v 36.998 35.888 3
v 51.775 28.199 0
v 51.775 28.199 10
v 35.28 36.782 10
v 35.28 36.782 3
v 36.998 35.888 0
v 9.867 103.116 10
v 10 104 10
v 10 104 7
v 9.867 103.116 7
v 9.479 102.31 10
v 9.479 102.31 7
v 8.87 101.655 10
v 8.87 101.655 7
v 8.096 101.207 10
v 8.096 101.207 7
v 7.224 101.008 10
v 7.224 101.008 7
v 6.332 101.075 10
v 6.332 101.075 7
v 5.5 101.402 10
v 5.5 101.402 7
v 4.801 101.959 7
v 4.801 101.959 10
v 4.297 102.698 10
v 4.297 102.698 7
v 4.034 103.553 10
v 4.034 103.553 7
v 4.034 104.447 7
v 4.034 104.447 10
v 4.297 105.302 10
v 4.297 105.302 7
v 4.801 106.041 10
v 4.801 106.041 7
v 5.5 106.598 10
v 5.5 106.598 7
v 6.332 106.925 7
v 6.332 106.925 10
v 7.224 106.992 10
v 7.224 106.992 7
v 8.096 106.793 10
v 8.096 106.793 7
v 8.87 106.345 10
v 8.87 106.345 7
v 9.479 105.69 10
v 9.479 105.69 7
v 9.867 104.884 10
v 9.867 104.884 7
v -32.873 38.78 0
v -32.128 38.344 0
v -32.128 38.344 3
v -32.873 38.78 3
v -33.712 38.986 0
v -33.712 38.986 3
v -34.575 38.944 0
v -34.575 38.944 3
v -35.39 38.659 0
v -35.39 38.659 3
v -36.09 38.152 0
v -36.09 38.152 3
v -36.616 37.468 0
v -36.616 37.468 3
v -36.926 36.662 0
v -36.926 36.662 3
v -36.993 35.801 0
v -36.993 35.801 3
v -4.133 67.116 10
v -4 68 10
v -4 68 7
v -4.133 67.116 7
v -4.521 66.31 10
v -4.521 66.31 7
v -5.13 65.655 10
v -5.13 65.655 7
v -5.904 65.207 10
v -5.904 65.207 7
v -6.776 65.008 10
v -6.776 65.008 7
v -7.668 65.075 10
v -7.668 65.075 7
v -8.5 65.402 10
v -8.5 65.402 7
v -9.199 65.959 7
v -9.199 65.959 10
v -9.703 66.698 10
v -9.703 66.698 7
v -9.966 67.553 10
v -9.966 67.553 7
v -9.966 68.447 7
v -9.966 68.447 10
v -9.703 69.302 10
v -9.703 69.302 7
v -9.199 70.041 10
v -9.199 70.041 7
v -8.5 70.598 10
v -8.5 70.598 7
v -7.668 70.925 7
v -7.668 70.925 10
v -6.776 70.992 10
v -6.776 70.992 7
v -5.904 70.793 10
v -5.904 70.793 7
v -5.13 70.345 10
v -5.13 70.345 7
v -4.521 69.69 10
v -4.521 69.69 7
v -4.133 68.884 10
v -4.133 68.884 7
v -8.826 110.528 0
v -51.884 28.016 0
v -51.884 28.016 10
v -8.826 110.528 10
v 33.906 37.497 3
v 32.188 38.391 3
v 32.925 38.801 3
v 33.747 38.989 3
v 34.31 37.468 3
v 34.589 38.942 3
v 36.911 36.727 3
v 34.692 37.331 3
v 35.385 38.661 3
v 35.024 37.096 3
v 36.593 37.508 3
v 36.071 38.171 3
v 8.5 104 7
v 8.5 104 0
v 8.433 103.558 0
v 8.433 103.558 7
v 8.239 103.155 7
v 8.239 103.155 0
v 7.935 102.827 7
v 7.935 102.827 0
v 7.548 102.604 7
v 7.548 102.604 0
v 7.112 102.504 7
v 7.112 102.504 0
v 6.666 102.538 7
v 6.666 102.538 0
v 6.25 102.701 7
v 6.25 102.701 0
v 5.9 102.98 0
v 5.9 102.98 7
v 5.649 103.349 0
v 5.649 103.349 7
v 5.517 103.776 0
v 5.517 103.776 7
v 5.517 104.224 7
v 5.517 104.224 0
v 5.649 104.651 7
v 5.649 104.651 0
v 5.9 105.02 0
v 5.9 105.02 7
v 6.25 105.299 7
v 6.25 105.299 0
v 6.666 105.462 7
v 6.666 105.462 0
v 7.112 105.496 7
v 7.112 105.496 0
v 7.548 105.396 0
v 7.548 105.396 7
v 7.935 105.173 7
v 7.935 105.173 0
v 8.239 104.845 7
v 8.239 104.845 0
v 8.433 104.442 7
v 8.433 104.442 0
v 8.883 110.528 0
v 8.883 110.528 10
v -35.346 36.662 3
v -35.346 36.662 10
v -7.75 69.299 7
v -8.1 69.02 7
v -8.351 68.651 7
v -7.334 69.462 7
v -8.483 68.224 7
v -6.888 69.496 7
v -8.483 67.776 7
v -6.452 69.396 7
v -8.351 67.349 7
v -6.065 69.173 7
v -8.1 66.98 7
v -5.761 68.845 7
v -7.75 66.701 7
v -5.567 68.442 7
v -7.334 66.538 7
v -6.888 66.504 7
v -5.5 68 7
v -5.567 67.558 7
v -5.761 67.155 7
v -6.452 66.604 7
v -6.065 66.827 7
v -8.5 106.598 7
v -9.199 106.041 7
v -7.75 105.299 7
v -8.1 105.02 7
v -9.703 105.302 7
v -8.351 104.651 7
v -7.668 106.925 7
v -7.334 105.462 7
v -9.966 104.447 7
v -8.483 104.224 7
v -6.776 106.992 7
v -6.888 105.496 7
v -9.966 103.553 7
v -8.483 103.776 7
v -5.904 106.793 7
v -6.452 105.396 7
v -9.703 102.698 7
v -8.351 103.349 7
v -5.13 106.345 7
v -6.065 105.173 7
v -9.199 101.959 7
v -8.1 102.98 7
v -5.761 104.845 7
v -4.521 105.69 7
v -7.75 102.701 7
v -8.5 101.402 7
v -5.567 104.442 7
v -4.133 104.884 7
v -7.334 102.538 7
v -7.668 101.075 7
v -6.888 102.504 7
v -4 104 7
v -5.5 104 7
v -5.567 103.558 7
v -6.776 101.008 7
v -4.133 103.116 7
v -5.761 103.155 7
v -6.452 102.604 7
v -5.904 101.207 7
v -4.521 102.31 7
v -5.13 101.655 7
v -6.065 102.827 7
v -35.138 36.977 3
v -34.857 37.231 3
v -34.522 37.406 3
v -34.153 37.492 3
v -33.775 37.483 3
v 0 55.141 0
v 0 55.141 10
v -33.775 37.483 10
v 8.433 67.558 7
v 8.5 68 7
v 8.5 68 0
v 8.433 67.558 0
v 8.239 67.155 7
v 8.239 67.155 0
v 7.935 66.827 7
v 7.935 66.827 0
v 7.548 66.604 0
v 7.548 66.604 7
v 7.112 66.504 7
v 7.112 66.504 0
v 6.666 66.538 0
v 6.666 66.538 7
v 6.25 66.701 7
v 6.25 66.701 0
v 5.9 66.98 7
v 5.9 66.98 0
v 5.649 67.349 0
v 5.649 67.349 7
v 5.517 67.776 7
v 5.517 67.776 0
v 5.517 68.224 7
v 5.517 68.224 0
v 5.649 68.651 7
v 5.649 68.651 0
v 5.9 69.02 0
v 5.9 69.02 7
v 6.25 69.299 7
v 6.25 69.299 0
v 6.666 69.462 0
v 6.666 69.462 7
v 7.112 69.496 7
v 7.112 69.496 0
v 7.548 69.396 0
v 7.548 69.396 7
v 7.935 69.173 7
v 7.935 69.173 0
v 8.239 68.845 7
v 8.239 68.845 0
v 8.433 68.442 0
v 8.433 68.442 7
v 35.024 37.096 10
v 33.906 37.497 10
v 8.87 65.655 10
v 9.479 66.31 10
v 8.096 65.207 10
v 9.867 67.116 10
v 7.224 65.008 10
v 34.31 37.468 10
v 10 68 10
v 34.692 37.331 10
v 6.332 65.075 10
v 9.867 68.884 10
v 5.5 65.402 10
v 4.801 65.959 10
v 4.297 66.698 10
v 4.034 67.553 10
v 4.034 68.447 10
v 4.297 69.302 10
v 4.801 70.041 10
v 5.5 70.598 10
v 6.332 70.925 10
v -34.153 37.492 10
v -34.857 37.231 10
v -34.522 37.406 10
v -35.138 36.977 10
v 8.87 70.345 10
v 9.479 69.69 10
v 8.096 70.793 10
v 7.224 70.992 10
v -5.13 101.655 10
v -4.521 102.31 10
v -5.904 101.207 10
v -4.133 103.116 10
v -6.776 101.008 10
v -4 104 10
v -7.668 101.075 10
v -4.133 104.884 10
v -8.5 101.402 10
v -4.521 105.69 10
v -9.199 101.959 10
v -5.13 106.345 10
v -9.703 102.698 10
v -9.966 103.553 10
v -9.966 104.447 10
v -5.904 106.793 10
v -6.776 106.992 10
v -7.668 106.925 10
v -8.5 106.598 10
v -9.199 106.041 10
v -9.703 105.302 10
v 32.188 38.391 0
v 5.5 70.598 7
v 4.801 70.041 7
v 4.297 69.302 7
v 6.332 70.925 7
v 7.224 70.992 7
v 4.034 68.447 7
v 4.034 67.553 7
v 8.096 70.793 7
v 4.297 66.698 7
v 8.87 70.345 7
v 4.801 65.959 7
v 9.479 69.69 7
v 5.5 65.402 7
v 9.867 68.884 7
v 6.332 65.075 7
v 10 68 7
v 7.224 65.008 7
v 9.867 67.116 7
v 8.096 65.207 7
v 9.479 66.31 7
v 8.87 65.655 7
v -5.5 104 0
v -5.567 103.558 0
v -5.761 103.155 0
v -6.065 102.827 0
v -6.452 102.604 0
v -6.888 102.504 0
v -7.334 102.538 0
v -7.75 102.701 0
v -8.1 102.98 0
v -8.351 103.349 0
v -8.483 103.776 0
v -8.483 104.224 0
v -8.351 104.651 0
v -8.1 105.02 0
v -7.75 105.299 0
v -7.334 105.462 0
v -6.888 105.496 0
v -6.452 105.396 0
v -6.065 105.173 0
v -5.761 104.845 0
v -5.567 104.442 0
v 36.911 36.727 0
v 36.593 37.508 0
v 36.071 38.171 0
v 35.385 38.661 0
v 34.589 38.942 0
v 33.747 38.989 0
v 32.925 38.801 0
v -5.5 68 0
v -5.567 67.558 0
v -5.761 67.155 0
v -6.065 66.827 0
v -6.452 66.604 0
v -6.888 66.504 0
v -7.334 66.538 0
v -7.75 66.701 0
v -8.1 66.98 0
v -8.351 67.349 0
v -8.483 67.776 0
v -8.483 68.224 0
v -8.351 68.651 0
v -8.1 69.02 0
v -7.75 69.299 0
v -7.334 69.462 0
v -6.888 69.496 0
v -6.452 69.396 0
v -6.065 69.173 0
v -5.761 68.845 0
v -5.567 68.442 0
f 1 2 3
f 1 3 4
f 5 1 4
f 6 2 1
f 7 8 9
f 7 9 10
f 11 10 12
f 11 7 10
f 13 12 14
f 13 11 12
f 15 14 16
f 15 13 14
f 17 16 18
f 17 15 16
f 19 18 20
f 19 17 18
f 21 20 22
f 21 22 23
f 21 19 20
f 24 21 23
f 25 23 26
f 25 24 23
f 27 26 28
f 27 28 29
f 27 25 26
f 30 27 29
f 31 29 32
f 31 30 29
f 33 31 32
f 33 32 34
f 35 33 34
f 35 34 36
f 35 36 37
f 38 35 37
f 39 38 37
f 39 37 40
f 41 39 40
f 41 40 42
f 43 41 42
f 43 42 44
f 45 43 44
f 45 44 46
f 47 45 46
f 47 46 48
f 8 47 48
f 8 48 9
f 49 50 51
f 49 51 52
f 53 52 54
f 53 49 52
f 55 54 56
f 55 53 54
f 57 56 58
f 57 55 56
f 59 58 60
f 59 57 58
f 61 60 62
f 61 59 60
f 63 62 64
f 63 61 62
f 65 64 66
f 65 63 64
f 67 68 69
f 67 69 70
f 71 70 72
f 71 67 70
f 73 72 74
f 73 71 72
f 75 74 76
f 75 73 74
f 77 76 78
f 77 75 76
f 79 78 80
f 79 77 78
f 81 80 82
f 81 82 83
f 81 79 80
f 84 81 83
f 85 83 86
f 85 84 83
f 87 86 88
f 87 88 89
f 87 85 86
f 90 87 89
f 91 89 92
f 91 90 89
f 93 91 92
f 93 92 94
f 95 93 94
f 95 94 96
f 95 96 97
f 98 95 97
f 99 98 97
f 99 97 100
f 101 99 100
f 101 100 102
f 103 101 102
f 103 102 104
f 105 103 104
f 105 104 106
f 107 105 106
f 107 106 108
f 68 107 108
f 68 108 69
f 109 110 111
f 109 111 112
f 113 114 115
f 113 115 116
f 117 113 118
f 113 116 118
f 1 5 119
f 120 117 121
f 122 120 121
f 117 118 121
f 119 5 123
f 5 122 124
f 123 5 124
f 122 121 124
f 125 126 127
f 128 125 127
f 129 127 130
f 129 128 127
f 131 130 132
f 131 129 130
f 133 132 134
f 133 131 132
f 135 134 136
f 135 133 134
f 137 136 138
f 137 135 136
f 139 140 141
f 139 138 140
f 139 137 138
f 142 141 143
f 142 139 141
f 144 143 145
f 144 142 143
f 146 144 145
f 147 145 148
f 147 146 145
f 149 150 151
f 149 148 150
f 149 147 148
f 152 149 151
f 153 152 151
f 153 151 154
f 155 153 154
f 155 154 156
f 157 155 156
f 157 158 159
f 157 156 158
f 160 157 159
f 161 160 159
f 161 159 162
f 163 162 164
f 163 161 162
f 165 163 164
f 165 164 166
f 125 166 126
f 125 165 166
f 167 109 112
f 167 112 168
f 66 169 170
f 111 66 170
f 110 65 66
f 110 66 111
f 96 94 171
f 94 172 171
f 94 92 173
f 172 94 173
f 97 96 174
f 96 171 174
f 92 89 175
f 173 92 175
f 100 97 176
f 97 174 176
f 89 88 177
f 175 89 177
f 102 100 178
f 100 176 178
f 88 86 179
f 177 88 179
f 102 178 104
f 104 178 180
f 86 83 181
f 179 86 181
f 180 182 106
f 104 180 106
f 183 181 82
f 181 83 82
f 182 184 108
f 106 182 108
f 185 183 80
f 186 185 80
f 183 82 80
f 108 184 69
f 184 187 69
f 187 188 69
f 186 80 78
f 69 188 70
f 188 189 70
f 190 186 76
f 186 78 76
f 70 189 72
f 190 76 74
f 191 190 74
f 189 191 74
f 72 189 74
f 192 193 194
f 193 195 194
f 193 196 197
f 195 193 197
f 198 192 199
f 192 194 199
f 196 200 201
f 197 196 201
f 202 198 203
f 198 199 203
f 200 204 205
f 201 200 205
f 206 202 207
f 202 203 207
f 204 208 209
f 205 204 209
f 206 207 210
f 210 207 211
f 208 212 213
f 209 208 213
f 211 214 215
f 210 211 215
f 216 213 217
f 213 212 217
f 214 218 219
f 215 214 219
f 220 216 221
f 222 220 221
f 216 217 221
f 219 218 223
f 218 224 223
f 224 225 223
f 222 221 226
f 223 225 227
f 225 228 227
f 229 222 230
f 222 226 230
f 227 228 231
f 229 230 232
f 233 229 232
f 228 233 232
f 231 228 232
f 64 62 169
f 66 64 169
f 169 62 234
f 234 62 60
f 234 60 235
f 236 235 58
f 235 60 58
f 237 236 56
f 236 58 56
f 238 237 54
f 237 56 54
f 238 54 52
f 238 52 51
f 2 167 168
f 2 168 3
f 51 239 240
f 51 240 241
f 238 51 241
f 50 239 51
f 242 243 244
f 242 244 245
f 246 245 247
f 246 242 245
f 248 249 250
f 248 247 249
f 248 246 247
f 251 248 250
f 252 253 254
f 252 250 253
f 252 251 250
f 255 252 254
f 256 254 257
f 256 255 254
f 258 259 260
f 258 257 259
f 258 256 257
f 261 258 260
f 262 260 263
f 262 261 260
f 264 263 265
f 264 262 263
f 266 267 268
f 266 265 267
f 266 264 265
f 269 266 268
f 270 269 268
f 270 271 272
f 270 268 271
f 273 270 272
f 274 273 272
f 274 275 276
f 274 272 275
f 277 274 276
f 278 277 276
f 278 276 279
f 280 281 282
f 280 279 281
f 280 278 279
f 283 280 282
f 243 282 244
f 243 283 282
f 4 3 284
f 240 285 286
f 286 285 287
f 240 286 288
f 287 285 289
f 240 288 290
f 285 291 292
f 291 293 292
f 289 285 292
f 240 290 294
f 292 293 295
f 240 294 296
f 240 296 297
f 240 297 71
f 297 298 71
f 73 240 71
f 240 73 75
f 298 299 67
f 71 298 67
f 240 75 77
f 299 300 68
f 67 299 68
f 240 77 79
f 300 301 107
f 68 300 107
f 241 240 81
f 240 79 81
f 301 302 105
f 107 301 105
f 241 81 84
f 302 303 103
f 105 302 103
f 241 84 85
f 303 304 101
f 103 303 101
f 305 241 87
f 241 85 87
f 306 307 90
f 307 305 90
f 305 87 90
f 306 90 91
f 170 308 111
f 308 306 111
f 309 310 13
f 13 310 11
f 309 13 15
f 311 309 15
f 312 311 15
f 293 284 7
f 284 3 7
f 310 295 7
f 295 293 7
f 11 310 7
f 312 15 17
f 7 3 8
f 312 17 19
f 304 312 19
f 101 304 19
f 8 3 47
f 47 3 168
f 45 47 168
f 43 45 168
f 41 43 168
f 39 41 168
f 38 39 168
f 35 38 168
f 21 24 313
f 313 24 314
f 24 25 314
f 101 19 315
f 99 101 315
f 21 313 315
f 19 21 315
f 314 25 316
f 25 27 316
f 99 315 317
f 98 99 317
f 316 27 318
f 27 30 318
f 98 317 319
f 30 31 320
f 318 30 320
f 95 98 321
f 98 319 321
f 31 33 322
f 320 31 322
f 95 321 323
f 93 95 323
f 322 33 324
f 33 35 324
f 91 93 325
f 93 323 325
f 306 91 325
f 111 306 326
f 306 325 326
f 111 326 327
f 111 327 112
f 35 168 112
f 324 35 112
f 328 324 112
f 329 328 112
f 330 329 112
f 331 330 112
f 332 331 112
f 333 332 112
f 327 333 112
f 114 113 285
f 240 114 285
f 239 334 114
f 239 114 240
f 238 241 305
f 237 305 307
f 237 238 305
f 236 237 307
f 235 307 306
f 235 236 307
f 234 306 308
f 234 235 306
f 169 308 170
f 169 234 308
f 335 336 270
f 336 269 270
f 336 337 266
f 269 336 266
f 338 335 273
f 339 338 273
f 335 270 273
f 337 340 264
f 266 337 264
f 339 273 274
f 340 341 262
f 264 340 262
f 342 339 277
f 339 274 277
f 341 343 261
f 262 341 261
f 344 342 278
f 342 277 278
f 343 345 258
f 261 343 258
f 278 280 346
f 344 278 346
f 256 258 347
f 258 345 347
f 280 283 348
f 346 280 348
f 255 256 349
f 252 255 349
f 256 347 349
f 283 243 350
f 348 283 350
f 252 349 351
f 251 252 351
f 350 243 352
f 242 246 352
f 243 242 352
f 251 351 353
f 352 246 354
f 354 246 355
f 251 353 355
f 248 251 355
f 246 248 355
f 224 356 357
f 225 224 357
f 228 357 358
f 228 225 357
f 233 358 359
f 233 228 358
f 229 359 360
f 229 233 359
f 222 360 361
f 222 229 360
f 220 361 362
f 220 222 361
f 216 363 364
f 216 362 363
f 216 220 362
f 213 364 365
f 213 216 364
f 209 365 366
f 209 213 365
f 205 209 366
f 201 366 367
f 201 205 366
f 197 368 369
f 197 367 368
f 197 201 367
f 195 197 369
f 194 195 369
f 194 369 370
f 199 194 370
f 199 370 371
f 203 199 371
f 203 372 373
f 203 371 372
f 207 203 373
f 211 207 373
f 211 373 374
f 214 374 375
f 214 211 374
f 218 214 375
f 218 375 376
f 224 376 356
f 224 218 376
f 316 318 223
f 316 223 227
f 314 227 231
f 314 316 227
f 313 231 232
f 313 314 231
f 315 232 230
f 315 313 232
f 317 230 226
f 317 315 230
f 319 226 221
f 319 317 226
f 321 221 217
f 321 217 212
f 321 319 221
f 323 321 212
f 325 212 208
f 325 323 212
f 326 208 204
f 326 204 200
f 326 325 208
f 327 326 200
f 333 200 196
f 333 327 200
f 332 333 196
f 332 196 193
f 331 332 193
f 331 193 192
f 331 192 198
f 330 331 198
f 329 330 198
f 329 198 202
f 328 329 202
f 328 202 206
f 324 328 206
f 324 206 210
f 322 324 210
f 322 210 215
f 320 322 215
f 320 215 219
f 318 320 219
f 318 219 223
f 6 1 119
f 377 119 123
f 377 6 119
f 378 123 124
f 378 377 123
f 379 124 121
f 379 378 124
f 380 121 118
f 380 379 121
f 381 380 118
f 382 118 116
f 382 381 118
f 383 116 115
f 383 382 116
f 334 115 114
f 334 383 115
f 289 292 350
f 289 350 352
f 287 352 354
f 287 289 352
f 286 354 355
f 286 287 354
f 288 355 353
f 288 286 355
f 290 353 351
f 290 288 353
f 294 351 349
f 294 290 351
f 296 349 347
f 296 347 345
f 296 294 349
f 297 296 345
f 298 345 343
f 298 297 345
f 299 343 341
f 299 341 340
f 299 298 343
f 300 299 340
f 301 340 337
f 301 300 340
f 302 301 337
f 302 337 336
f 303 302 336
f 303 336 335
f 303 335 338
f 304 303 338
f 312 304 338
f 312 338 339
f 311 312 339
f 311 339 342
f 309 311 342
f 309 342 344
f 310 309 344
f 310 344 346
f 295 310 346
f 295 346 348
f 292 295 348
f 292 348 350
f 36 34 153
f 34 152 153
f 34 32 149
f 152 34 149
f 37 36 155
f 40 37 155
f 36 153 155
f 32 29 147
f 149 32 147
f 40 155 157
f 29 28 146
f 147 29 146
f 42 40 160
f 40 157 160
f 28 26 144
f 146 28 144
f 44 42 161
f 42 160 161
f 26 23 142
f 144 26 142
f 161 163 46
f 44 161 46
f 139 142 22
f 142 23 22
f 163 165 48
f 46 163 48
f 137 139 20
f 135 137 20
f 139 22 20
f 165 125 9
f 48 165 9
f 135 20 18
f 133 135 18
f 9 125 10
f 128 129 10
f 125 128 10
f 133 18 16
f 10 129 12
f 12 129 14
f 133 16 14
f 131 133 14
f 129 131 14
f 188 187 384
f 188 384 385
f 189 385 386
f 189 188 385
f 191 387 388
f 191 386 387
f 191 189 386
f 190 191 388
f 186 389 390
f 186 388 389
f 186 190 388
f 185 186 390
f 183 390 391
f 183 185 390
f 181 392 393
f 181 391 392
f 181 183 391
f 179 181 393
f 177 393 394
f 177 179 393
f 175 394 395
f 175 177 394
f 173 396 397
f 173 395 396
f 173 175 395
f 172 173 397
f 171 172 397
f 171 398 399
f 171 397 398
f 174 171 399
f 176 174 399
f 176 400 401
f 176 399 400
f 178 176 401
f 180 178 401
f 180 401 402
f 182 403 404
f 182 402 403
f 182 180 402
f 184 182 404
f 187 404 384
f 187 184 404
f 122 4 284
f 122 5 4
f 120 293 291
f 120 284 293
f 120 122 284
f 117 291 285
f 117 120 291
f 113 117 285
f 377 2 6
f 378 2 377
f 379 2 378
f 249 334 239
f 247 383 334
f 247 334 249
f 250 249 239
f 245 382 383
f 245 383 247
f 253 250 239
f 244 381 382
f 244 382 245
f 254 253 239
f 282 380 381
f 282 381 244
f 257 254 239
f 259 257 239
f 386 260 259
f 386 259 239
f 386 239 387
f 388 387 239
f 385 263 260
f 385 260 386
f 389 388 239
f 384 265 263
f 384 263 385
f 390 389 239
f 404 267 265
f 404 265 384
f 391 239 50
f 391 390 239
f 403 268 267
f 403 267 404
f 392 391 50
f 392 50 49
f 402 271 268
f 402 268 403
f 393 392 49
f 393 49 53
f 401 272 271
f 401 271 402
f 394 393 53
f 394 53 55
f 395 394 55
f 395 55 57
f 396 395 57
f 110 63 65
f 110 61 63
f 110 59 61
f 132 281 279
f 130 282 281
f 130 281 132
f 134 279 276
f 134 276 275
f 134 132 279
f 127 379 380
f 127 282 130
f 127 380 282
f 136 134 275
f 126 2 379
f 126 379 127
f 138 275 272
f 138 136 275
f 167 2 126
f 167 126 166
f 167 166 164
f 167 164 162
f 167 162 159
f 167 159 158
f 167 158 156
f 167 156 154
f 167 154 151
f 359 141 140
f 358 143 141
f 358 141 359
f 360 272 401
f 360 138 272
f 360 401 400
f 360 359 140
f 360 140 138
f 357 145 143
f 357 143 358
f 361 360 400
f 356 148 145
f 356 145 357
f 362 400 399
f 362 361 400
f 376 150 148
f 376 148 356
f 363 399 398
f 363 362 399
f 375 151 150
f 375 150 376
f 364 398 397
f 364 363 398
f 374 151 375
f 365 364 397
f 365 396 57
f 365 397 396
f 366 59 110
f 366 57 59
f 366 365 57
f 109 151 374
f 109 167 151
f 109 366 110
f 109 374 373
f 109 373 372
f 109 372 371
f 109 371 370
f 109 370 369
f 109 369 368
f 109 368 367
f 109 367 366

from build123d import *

# Parameters (mm, degrees)
CYLINDER423_R               = 3
CYLINDER423_DEPTH           = 4
CYLINDER422_R               = 3
CYLINDER422_DEPTH           = 4
CYLINDER420_R               = 3
CYLINDER420_DEPTH           = 4
CYLINDER421_R               = 3
CYLINDER421_DEPTH           = 4
COMPOUND319_PLACEMENT_ANGLE = 90
CYLINDER419_R               = 1.5
CYLINDER419_DEPTH           = 20
CYLINDER418_R               = 1.5
CYLINDER418_DEPTH           = 20
CYLINDER416_R               = 1.5
CYLINDER416_DEPTH           = 20
CYLINDER417_R               = 1.5
CYLINDER417_DEPTH           = 20
COMPOUND318_PLACEMENT_ANGLE = 90
CYLINDER309_R               = 1.5
CYLINDER309_DEPTH           = 50
CYLINDER310_R               = 1.5
CYLINDER310_DEPTH           = 50
CYLINDER307_R               = 3
CYLINDER307_DEPTH           = 4
CYLINDER308_R               = 3
CYLINDER308_DEPTH           = 4
PAD_DEPTH                   = 10


with BuildPart() as v_lec423:
    # Cylinder423 → Cylinder423 (new body)
    with BuildSketch(Plane(origin=(-7, -34, 37), x_dir=(1, 0, 0), z_dir=(0, -1, 0))):
        Circle(CYLINDER423_R)
    extrude(amount=CYLINDER423_DEPTH)


with BuildPart() as v_lec422:
    # Cylinder422 → Cylinder422 (new body)
    with BuildSketch(Plane(origin=(7, -34, 73), x_dir=(1, 0, 0), z_dir=(0, -1, 0))):
        Circle(CYLINDER422_R)
    extrude(amount=CYLINDER422_DEPTH)


with BuildPart() as v_lec420:
    # Cylinder420 → Cylinder420 (new body)
    with BuildSketch(Plane(origin=(-7, -34, 73), x_dir=(1, 0, 0), z_dir=(0, -1, 0))):
        Circle(CYLINDER420_R)
    extrude(amount=CYLINDER420_DEPTH)


with BuildPart() as compound319:
    # Cylinder421 → Cylinder421 (new body)
    with BuildSketch(Plane(origin=(7, -34, 37), x_dir=(1, 0, 0), z_dir=(0, -1, 0))):
        Circle(CYLINDER421_R)
    extrude(amount=CYLINDER421_DEPTH)

    # Compound319: union Válec423, Válec422, Válec420
    add(v_lec423.part)
    add(v_lec422.part)
    add(v_lec420.part)


with BuildPart() as compound319_1:
    # Compound319 placement: moved
    add(compound319.part.moved(Location((0, 141, 45))).rotate(Axis((0, 141, 45), (1, 0, 0)), COMPOUND319_PLACEMENT_ANGLE))


with BuildPart() as v_lec419:
    # Cylinder419 → Cylinder419 (new body)
    with BuildSketch(Plane(origin=(-7, -34, 37), x_dir=(1, 0, 0), z_dir=(0, -1, 0))):
        Circle(CYLINDER419_R)
    extrude(amount=CYLINDER419_DEPTH)


with BuildPart() as v_lec418:
    # Cylinder418 → Cylinder418 (new body)
    with BuildSketch(Plane(origin=(7, -34, 73), x_dir=(1, 0, 0), z_dir=(0, -1, 0))):
        Circle(CYLINDER418_R)
    extrude(amount=CYLINDER418_DEPTH)


with BuildPart() as v_lec416:
    # Cylinder416 → Cylinder416 (new body)
    with BuildSketch(Plane(origin=(-7, -34, 73), x_dir=(1, 0, 0), z_dir=(0, -1, 0))):
        Circle(CYLINDER416_R)
    extrude(amount=CYLINDER416_DEPTH)


with BuildPart() as compound318:
    # Cylinder417 → Cylinder417 (new body)
    with BuildSketch(Plane(origin=(7, -34, 37), x_dir=(1, 0, 0), z_dir=(0, -1, 0))):
        Circle(CYLINDER417_R)
    extrude(amount=CYLINDER417_DEPTH)

    # Compound318: union Válec419, Válec418, Válec416
    add(v_lec419.part)
    add(v_lec418.part)
    add(v_lec416.part)


with BuildPart() as compound318_1:
    # Compound318 placement: moved
    add(compound318.part.moved(Location((0, 141, 45))).rotate(Axis((0, 141, 45), (1, 0, 0)), COMPOUND318_PLACEMENT_ANGLE))


with BuildPart() as v_lec309:
    # Cylinder309 → Cylinder309 (new body)
    with BuildSketch(Plane(origin=(34, 36, 0), x_dir=(1, 0, 0), z_dir=(0, 0, 1))):
        Circle(CYLINDER309_R)
    extrude(amount=CYLINDER309_DEPTH)


with BuildPart() as compound289:
    # Cylinder310 → Cylinder310 (new body)
    with BuildSketch(Plane(origin=(-34, 36, 0), x_dir=(1, 0, 0), z_dir=(0, 0, 1))):
        Circle(CYLINDER310_R)
    extrude(amount=CYLINDER310_DEPTH)

    # Compound289: union Válec309
    add(v_lec309.part)


with BuildPart() as v_lec307:
    # Cylinder307 → Cylinder307 (new body)
    with BuildSketch(Plane(origin=(-34, 36, -1), x_dir=(1, 0, 0), z_dir=(0, 0, 1))):
        Circle(CYLINDER307_R)
    extrude(amount=CYLINDER307_DEPTH)


with BuildPart() as compound288:
    # Cylinder308 → Cylinder308 (new body)
    with BuildSketch(Plane(origin=(34, 36, -1), x_dir=(1, 0, 0), z_dir=(0, 0, 1))):
        Circle(CYLINDER308_R)
    extrude(amount=CYLINDER308_DEPTH)

    # Compound288: union Válec307
    add(v_lec307.part)


with BuildPart() as cut167:
    # Sketch → Pad (new body)
    with BuildSketch(Plane.XY):
        Polygon((-51.883896, 28.015725), (-8.825714, 110.528281), (8.883465, 110.528281), (51.774643, 28.198511), (0, 55.140807), align=None)
    extrude(amount=PAD_DEPTH)

    # Cut134: cut Compound288
    add(compound288.part, mode=Mode.SUBTRACT)

    # Cut135: cut Compound289
    add(compound289.part, mode=Mode.SUBTRACT)

    # Cut165: cut Compound318
    add(compound318_1.part, mode=Mode.SUBTRACT)

    # Cut167: cut Compound319
    add(compound319_1.part, mode=Mode.SUBTRACT)


solid = cut167.part
